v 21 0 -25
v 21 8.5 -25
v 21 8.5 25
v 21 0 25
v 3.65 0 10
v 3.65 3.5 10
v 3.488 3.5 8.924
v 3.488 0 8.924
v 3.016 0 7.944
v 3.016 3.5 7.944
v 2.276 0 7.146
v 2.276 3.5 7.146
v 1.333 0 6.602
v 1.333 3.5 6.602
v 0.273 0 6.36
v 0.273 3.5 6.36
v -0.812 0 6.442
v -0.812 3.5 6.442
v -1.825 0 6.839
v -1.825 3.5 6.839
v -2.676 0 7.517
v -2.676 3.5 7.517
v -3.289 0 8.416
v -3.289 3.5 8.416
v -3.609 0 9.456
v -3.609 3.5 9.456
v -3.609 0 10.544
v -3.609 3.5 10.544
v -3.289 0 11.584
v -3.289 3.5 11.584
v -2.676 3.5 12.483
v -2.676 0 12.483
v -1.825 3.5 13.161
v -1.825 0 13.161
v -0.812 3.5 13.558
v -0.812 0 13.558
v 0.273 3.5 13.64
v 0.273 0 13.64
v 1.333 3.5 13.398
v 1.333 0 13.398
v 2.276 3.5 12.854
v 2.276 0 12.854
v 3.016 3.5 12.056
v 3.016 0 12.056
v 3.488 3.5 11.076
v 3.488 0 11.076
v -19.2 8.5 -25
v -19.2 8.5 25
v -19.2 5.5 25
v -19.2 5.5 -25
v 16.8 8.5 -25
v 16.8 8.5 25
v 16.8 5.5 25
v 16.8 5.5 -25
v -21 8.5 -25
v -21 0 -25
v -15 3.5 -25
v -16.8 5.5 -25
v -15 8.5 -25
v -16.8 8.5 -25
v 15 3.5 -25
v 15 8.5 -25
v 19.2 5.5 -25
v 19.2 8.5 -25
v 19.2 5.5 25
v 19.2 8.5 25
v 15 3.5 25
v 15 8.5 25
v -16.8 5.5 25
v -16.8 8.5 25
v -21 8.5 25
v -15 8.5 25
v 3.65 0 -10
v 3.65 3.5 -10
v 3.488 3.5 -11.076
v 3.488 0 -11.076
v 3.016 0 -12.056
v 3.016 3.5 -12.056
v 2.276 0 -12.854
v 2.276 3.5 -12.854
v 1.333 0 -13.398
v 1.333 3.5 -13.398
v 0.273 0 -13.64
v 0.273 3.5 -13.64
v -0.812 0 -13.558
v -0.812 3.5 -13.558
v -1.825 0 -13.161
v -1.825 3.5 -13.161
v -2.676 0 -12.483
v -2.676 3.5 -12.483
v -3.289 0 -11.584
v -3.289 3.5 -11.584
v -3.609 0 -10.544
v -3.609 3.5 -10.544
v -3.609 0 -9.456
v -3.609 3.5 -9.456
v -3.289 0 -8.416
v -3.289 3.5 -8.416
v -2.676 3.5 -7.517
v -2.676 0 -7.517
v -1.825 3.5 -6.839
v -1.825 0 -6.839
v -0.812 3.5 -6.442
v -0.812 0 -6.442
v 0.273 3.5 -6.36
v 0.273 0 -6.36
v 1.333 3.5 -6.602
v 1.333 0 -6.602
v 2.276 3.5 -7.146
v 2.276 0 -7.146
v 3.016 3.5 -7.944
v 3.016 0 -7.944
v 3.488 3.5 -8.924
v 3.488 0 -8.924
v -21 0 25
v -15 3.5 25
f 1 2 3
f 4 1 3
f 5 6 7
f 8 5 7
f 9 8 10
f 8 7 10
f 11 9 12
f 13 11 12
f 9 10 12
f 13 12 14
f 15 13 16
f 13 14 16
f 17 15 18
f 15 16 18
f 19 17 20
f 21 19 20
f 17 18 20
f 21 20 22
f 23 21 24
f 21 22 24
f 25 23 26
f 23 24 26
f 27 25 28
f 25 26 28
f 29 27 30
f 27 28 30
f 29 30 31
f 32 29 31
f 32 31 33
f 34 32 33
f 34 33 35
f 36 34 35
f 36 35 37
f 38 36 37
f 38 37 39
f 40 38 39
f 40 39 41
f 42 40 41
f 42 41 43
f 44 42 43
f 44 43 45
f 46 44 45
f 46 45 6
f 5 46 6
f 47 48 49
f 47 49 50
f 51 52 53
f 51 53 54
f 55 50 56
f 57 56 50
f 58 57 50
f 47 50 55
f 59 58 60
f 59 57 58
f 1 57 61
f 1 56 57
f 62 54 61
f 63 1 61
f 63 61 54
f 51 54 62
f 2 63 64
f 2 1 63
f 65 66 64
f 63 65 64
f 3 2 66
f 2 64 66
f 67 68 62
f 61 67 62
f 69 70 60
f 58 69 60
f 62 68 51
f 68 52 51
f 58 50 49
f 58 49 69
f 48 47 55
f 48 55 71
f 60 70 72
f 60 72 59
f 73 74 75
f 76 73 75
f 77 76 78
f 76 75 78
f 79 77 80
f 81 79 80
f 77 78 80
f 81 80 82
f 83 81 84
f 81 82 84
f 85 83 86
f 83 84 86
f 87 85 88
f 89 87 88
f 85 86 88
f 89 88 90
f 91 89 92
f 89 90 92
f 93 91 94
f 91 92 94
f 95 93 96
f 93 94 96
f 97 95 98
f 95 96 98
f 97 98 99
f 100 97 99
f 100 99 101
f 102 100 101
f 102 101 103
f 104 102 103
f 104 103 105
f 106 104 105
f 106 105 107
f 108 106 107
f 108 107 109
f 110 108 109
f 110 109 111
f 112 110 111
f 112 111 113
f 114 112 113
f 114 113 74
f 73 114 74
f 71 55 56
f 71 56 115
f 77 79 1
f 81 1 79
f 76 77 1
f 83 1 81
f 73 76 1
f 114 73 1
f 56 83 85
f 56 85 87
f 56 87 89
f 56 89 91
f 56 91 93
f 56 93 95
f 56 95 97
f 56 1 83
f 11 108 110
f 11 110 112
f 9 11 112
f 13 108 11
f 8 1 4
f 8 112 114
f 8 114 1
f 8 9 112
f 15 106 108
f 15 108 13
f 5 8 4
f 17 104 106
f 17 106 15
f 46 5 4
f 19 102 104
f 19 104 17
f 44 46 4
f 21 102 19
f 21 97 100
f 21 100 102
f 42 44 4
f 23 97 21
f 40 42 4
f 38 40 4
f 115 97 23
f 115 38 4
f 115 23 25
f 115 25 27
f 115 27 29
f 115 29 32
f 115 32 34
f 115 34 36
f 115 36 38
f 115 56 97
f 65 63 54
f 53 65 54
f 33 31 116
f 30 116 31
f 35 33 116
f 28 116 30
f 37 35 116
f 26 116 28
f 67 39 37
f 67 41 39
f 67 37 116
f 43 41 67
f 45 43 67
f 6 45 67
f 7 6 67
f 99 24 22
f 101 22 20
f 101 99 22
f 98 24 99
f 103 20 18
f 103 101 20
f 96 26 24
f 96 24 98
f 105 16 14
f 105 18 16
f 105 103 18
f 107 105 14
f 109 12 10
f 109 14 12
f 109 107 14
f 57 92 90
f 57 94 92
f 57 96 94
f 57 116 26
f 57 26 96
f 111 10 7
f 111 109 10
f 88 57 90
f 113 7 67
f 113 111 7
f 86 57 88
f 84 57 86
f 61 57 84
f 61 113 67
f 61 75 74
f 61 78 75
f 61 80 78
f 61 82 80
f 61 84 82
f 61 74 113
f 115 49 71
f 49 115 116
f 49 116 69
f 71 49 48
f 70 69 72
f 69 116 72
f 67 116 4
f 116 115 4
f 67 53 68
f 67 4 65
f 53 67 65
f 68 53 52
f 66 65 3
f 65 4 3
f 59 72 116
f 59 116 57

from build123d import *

# Parameters (mm, degrees)
SKETCH1_W               = 40
SKETCH1_H               = 50
BOSS_EXTRUDE1_DEPTH     = 3.5
SKETCH2_W               = 40
SKETCH2_H               = 4
BOSS_EXTRUDE2_DEPTH     = 5
SKETCH3_W               = 4
SKETCH3_H               = 46
BOSS_EXTRUDE3_DEPTH     = 5
SKETCH4_W               = 2.4
SKETCH4_H               = 50
CUT_EXTRUDE1_DEPTH      = 3
SKETCH18_W              = 50
SKETCH18_H              = 8.5
BOSS_EXTRUDE8_DEPTH     = 1
SKETCH19_R              = 3.65
CUT_EXTRUDE2_DEPTH      = 6
CUT_EXTRUDE2_DEPTH_BACK = 4.5
SKETCH20_W              = 32
SKETCH20_H              = 4
CUT_EXTRUDE3_DEPTH      = 5
SKETCH21_W              = 50
SKETCH21_H              = 5
BOSS_EXTRUDE9_DEPTH     = 1


with BuildPart() as part:
    # Sketch1 → Boss-Extrude1 (new body)
    with BuildSketch(Plane(origin=(0, 0, 0), x_dir=(1, 0, 0), z_dir=(0, 1, 0))):
        Rectangle(SKETCH1_W, SKETCH1_H)
    extrude(amount=BOSS_EXTRUDE1_DEPTH)

    # Sketch2 → Boss-Extrude2 (add)
    with BuildSketch(Plane(origin=(0, 3.5, 0), x_dir=(1, 0, 0), z_dir=(0, 1, 0))):
        with Locations((0, 23)):
            Rectangle(SKETCH2_W, SKETCH2_H)
    extrude(amount=BOSS_EXTRUDE2_DEPTH)

    # Sketch3 → Boss-Extrude3 (add)
    with BuildSketch(Plane(origin=(0, 3.5, 0), x_dir=(1, 0, 0), z_dir=(0, 1, 0))):
        with Locations((-18, -2)):
            Rectangle(SKETCH3_W, SKETCH3_H)
    boss_extrude3 = extrude(amount=BOSS_EXTRUDE3_DEPTH)

    # Sketch4 → Cut-Extrude1 (cut)
    with BuildSketch(Plane(origin=(0, 8.5, 0), x_dir=(1, 0, 0), z_dir=(0, 1, 0))):
        with Locations((-18, 0)):
            Rectangle(SKETCH4_W, SKETCH4_H)
    cut_extrude1 = extrude(amount=-CUT_EXTRUDE1_DEPTH, mode=Mode.SUBTRACT)

    # Mirror1: Boss-Extrude3, Cut-Extrude1 across plane
    add(boss_extrude3.mirror(Plane(origin=(0, 0, 0), x_dir=(0, 0, 1), z_dir=(1, 0, 0))))
    add(cut_extrude1.mirror(Plane(origin=(0, 0, 0), x_dir=(0, 0, 1), z_dir=(1, 0, 0))), mode=Mode.SUBTRACT)

    # Sketch18 → Boss-Extrude8 (add)
    with BuildSketch(Plane.ZY.offset(20)):
        with Locations((0, 4.25)):
            Rectangle(SKETCH18_W, SKETCH18_H)
    boss_extrude8 = extrude(amount=BOSS_EXTRUDE8_DEPTH)

    # Mirror5: Boss-Extrude8 across plane
    add(boss_extrude8.mirror(Plane(origin=(0, 0, 0), x_dir=(0, 0, 1), z_dir=(1, 0, 0))))

    # Sketch19 → Cut-Extrude2 (cut, two sides)
    with BuildSketch(Plane(origin=(0, 3.5, 0), x_dir=(1, 0, 0), z_dir=(0, 1, 0))) as cut_extrude2_sk:
        with Locations((0, -10)):
            Circle(SKETCH19_R)
        with Locations((0, 10)):
            Circle(SKETCH19_R)
    extrude(amount=CUT_EXTRUDE2_DEPTH, mode=Mode.SUBTRACT)
    extrude(cut_extrude2_sk.sketch, amount=-CUT_EXTRUDE2_DEPTH_BACK, mode=Mode.SUBTRACT)

    # Sketch20 → Cut-Extrude3 (cut)
    with BuildSketch(Plane(origin=(0, 8.5, 0), x_dir=(1, 0, 0), z_dir=(0, 1, 0))):
        with Locations((0, 23)):
            Rectangle(SKETCH20_W, SKETCH20_H)
    extrude(amount=-CUT_EXTRUDE3_DEPTH, mode=Mode.SUBTRACT)

    # Sketch21 → Boss-Extrude9 (add)
    with BuildSketch(Plane(origin=(-16, 0, 0), x_dir=(0, 0, -1), z_dir=(1, 0, 0))):
        with Locations((0, 6)):
            Rectangle(SKETCH21_W, SKETCH21_H)
    boss_extrude9 = extrude(amount=BOSS_EXTRUDE9_DEPTH)

    # Mirror6: Boss-Extrude9 across plane
    add(boss_extrude9.mirror(Plane(origin=(0, 0, 0), x_dir=(0, 0, 1), z_dir=(1, 0, 0))))


solid = part.part
